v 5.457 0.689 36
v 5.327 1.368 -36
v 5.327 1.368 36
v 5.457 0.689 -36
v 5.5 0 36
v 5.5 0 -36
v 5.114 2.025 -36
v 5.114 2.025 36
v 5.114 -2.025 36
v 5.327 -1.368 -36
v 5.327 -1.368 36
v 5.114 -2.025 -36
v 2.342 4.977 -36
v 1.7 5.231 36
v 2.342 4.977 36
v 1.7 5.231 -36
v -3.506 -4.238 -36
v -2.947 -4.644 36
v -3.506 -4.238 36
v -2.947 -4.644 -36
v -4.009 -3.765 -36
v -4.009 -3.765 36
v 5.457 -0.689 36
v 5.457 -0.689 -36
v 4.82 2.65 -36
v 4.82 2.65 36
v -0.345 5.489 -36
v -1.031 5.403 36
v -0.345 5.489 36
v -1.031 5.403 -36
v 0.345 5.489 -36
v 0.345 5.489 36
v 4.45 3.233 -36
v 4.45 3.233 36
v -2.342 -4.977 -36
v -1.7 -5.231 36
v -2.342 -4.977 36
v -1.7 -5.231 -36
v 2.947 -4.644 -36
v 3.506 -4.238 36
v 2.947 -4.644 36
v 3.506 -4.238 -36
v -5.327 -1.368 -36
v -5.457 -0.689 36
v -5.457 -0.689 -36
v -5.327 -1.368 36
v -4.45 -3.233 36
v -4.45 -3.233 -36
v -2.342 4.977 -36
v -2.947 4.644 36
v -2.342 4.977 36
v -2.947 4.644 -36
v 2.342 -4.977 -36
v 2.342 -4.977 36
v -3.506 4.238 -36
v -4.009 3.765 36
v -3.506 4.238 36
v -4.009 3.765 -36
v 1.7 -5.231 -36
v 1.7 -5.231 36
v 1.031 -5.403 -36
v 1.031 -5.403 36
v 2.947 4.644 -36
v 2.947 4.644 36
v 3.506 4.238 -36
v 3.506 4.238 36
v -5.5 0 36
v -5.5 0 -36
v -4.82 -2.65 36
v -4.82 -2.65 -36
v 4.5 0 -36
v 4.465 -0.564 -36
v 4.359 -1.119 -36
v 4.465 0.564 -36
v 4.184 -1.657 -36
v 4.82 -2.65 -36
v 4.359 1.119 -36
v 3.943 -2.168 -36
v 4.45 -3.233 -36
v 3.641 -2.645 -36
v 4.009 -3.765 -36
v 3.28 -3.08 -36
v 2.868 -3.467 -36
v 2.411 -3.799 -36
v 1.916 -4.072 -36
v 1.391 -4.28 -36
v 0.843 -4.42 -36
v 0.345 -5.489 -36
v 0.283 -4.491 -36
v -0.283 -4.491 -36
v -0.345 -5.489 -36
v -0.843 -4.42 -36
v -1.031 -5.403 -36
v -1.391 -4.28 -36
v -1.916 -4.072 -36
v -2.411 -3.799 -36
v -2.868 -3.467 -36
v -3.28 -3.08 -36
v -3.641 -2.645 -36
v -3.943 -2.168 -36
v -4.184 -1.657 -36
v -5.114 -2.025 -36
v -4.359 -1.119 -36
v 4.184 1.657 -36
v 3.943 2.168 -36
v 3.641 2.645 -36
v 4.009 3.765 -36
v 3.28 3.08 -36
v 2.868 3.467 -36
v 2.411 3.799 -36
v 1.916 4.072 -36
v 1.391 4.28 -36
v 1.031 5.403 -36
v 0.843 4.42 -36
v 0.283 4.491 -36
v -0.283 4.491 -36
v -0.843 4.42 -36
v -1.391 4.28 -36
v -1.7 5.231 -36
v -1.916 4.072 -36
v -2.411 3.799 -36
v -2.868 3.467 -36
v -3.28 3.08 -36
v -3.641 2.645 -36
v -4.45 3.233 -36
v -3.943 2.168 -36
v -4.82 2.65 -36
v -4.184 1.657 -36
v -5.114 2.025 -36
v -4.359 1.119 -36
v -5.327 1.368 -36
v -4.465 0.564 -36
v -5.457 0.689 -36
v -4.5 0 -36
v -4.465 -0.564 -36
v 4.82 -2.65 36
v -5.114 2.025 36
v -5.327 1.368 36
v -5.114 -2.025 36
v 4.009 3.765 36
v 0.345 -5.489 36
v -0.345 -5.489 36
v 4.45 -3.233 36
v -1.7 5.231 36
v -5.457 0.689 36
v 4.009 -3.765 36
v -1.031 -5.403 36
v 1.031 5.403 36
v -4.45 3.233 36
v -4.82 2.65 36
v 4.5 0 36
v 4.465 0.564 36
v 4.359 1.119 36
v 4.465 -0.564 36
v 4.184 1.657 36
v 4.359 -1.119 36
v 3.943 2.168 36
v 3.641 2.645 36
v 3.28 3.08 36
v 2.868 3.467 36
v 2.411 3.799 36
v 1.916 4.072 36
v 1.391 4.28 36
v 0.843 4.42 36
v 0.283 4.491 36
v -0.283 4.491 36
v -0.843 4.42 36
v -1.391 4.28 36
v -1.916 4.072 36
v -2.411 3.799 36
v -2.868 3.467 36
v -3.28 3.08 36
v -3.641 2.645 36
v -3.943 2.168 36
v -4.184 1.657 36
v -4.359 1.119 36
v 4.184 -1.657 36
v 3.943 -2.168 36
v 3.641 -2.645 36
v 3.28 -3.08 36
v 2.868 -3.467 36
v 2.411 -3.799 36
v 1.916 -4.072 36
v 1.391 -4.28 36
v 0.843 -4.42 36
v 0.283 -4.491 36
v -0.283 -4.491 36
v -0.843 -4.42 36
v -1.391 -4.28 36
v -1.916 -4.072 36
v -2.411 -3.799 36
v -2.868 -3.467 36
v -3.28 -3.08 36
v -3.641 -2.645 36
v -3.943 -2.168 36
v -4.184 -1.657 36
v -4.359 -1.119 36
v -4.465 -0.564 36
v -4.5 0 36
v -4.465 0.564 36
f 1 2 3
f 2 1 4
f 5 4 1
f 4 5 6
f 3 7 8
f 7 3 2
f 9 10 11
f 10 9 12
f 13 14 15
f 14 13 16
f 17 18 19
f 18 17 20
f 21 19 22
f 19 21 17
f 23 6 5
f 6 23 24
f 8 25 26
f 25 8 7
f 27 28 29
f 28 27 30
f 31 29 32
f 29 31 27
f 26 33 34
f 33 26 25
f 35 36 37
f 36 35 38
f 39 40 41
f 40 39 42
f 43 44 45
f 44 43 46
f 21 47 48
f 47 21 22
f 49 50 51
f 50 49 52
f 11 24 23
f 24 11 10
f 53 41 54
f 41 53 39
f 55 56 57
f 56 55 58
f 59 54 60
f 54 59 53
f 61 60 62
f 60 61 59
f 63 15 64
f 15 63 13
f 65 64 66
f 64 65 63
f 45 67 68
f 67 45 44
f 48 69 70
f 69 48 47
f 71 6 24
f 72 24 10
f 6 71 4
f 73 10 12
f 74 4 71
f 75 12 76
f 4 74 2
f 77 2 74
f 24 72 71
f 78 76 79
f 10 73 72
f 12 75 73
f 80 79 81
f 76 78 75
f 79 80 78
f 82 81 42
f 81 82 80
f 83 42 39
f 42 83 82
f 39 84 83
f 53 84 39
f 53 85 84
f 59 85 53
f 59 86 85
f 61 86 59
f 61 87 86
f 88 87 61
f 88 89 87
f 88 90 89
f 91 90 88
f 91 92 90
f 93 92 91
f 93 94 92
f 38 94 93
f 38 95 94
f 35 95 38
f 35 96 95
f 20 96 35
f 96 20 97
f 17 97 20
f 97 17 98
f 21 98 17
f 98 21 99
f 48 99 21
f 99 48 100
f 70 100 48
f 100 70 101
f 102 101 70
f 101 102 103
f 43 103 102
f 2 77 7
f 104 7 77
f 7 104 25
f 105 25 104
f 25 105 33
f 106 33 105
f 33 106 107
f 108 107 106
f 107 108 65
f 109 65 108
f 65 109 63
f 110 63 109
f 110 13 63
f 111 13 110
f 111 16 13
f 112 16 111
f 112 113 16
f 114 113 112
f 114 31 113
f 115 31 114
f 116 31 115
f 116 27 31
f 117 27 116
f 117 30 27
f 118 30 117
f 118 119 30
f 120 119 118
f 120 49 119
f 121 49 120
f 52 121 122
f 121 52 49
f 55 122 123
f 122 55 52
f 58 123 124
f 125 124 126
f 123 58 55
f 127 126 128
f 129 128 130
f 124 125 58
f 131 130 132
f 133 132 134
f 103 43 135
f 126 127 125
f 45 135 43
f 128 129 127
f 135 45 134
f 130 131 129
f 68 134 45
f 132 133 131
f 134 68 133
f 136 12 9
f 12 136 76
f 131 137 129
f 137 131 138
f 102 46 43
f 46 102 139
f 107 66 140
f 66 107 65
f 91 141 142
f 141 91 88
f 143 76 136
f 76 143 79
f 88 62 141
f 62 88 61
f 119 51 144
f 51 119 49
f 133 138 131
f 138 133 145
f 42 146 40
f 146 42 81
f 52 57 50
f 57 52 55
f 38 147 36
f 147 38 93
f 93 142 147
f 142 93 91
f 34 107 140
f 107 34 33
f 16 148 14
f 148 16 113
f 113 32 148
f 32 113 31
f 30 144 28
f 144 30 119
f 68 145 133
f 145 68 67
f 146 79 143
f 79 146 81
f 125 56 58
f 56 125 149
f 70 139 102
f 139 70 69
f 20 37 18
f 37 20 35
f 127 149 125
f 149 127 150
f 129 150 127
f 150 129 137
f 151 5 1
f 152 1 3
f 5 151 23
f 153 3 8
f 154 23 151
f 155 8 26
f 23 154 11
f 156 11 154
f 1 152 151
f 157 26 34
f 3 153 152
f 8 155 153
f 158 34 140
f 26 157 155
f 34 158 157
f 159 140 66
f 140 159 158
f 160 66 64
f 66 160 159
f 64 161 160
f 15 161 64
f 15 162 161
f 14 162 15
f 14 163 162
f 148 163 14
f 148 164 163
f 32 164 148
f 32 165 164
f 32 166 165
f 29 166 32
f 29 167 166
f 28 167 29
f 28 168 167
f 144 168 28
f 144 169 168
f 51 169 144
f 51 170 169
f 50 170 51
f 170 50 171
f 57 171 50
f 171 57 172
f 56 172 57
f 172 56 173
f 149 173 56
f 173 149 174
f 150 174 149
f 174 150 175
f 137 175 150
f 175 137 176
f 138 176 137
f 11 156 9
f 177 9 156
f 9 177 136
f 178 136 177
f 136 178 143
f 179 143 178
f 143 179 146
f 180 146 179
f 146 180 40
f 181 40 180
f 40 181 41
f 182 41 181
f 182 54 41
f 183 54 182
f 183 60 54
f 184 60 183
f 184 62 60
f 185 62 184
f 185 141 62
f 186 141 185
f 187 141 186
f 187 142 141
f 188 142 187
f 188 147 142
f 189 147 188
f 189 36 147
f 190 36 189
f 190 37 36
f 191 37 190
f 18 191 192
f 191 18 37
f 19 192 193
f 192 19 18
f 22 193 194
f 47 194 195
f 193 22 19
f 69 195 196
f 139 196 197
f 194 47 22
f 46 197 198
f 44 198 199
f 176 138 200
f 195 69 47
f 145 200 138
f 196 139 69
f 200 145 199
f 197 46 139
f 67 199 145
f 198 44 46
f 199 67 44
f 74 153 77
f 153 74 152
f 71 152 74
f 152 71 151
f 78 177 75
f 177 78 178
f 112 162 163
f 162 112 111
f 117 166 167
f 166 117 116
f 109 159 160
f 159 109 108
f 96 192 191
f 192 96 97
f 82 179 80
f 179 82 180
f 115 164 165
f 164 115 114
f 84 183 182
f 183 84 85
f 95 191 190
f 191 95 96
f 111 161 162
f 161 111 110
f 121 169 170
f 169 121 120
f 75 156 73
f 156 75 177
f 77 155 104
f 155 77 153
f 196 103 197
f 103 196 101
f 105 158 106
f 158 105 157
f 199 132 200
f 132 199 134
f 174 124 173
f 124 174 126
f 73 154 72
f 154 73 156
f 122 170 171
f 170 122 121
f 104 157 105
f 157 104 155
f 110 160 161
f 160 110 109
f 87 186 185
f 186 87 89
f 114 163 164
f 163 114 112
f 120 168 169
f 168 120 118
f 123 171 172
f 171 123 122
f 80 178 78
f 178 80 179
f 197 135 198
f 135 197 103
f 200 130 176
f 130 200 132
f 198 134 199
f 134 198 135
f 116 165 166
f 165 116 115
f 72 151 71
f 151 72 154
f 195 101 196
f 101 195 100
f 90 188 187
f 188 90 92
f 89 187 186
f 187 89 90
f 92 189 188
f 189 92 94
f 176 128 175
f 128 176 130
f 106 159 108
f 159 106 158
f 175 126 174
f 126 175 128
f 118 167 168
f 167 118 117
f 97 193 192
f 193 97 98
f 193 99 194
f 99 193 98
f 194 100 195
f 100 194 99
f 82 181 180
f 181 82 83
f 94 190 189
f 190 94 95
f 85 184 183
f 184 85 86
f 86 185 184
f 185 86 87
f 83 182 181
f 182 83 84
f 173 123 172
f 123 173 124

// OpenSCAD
$fn = 50;


difference() {
	union() {
		translate(v = [0, 0, -36.0000000000]) {
			cylinder(h = 72, r = 5.5000000000);
		}
	}
	union() {
		translate(v = [0, 0, -100.0000000000]) {
			cylinder(h = 200, r = 4.5000000000);
		}
	}
}
